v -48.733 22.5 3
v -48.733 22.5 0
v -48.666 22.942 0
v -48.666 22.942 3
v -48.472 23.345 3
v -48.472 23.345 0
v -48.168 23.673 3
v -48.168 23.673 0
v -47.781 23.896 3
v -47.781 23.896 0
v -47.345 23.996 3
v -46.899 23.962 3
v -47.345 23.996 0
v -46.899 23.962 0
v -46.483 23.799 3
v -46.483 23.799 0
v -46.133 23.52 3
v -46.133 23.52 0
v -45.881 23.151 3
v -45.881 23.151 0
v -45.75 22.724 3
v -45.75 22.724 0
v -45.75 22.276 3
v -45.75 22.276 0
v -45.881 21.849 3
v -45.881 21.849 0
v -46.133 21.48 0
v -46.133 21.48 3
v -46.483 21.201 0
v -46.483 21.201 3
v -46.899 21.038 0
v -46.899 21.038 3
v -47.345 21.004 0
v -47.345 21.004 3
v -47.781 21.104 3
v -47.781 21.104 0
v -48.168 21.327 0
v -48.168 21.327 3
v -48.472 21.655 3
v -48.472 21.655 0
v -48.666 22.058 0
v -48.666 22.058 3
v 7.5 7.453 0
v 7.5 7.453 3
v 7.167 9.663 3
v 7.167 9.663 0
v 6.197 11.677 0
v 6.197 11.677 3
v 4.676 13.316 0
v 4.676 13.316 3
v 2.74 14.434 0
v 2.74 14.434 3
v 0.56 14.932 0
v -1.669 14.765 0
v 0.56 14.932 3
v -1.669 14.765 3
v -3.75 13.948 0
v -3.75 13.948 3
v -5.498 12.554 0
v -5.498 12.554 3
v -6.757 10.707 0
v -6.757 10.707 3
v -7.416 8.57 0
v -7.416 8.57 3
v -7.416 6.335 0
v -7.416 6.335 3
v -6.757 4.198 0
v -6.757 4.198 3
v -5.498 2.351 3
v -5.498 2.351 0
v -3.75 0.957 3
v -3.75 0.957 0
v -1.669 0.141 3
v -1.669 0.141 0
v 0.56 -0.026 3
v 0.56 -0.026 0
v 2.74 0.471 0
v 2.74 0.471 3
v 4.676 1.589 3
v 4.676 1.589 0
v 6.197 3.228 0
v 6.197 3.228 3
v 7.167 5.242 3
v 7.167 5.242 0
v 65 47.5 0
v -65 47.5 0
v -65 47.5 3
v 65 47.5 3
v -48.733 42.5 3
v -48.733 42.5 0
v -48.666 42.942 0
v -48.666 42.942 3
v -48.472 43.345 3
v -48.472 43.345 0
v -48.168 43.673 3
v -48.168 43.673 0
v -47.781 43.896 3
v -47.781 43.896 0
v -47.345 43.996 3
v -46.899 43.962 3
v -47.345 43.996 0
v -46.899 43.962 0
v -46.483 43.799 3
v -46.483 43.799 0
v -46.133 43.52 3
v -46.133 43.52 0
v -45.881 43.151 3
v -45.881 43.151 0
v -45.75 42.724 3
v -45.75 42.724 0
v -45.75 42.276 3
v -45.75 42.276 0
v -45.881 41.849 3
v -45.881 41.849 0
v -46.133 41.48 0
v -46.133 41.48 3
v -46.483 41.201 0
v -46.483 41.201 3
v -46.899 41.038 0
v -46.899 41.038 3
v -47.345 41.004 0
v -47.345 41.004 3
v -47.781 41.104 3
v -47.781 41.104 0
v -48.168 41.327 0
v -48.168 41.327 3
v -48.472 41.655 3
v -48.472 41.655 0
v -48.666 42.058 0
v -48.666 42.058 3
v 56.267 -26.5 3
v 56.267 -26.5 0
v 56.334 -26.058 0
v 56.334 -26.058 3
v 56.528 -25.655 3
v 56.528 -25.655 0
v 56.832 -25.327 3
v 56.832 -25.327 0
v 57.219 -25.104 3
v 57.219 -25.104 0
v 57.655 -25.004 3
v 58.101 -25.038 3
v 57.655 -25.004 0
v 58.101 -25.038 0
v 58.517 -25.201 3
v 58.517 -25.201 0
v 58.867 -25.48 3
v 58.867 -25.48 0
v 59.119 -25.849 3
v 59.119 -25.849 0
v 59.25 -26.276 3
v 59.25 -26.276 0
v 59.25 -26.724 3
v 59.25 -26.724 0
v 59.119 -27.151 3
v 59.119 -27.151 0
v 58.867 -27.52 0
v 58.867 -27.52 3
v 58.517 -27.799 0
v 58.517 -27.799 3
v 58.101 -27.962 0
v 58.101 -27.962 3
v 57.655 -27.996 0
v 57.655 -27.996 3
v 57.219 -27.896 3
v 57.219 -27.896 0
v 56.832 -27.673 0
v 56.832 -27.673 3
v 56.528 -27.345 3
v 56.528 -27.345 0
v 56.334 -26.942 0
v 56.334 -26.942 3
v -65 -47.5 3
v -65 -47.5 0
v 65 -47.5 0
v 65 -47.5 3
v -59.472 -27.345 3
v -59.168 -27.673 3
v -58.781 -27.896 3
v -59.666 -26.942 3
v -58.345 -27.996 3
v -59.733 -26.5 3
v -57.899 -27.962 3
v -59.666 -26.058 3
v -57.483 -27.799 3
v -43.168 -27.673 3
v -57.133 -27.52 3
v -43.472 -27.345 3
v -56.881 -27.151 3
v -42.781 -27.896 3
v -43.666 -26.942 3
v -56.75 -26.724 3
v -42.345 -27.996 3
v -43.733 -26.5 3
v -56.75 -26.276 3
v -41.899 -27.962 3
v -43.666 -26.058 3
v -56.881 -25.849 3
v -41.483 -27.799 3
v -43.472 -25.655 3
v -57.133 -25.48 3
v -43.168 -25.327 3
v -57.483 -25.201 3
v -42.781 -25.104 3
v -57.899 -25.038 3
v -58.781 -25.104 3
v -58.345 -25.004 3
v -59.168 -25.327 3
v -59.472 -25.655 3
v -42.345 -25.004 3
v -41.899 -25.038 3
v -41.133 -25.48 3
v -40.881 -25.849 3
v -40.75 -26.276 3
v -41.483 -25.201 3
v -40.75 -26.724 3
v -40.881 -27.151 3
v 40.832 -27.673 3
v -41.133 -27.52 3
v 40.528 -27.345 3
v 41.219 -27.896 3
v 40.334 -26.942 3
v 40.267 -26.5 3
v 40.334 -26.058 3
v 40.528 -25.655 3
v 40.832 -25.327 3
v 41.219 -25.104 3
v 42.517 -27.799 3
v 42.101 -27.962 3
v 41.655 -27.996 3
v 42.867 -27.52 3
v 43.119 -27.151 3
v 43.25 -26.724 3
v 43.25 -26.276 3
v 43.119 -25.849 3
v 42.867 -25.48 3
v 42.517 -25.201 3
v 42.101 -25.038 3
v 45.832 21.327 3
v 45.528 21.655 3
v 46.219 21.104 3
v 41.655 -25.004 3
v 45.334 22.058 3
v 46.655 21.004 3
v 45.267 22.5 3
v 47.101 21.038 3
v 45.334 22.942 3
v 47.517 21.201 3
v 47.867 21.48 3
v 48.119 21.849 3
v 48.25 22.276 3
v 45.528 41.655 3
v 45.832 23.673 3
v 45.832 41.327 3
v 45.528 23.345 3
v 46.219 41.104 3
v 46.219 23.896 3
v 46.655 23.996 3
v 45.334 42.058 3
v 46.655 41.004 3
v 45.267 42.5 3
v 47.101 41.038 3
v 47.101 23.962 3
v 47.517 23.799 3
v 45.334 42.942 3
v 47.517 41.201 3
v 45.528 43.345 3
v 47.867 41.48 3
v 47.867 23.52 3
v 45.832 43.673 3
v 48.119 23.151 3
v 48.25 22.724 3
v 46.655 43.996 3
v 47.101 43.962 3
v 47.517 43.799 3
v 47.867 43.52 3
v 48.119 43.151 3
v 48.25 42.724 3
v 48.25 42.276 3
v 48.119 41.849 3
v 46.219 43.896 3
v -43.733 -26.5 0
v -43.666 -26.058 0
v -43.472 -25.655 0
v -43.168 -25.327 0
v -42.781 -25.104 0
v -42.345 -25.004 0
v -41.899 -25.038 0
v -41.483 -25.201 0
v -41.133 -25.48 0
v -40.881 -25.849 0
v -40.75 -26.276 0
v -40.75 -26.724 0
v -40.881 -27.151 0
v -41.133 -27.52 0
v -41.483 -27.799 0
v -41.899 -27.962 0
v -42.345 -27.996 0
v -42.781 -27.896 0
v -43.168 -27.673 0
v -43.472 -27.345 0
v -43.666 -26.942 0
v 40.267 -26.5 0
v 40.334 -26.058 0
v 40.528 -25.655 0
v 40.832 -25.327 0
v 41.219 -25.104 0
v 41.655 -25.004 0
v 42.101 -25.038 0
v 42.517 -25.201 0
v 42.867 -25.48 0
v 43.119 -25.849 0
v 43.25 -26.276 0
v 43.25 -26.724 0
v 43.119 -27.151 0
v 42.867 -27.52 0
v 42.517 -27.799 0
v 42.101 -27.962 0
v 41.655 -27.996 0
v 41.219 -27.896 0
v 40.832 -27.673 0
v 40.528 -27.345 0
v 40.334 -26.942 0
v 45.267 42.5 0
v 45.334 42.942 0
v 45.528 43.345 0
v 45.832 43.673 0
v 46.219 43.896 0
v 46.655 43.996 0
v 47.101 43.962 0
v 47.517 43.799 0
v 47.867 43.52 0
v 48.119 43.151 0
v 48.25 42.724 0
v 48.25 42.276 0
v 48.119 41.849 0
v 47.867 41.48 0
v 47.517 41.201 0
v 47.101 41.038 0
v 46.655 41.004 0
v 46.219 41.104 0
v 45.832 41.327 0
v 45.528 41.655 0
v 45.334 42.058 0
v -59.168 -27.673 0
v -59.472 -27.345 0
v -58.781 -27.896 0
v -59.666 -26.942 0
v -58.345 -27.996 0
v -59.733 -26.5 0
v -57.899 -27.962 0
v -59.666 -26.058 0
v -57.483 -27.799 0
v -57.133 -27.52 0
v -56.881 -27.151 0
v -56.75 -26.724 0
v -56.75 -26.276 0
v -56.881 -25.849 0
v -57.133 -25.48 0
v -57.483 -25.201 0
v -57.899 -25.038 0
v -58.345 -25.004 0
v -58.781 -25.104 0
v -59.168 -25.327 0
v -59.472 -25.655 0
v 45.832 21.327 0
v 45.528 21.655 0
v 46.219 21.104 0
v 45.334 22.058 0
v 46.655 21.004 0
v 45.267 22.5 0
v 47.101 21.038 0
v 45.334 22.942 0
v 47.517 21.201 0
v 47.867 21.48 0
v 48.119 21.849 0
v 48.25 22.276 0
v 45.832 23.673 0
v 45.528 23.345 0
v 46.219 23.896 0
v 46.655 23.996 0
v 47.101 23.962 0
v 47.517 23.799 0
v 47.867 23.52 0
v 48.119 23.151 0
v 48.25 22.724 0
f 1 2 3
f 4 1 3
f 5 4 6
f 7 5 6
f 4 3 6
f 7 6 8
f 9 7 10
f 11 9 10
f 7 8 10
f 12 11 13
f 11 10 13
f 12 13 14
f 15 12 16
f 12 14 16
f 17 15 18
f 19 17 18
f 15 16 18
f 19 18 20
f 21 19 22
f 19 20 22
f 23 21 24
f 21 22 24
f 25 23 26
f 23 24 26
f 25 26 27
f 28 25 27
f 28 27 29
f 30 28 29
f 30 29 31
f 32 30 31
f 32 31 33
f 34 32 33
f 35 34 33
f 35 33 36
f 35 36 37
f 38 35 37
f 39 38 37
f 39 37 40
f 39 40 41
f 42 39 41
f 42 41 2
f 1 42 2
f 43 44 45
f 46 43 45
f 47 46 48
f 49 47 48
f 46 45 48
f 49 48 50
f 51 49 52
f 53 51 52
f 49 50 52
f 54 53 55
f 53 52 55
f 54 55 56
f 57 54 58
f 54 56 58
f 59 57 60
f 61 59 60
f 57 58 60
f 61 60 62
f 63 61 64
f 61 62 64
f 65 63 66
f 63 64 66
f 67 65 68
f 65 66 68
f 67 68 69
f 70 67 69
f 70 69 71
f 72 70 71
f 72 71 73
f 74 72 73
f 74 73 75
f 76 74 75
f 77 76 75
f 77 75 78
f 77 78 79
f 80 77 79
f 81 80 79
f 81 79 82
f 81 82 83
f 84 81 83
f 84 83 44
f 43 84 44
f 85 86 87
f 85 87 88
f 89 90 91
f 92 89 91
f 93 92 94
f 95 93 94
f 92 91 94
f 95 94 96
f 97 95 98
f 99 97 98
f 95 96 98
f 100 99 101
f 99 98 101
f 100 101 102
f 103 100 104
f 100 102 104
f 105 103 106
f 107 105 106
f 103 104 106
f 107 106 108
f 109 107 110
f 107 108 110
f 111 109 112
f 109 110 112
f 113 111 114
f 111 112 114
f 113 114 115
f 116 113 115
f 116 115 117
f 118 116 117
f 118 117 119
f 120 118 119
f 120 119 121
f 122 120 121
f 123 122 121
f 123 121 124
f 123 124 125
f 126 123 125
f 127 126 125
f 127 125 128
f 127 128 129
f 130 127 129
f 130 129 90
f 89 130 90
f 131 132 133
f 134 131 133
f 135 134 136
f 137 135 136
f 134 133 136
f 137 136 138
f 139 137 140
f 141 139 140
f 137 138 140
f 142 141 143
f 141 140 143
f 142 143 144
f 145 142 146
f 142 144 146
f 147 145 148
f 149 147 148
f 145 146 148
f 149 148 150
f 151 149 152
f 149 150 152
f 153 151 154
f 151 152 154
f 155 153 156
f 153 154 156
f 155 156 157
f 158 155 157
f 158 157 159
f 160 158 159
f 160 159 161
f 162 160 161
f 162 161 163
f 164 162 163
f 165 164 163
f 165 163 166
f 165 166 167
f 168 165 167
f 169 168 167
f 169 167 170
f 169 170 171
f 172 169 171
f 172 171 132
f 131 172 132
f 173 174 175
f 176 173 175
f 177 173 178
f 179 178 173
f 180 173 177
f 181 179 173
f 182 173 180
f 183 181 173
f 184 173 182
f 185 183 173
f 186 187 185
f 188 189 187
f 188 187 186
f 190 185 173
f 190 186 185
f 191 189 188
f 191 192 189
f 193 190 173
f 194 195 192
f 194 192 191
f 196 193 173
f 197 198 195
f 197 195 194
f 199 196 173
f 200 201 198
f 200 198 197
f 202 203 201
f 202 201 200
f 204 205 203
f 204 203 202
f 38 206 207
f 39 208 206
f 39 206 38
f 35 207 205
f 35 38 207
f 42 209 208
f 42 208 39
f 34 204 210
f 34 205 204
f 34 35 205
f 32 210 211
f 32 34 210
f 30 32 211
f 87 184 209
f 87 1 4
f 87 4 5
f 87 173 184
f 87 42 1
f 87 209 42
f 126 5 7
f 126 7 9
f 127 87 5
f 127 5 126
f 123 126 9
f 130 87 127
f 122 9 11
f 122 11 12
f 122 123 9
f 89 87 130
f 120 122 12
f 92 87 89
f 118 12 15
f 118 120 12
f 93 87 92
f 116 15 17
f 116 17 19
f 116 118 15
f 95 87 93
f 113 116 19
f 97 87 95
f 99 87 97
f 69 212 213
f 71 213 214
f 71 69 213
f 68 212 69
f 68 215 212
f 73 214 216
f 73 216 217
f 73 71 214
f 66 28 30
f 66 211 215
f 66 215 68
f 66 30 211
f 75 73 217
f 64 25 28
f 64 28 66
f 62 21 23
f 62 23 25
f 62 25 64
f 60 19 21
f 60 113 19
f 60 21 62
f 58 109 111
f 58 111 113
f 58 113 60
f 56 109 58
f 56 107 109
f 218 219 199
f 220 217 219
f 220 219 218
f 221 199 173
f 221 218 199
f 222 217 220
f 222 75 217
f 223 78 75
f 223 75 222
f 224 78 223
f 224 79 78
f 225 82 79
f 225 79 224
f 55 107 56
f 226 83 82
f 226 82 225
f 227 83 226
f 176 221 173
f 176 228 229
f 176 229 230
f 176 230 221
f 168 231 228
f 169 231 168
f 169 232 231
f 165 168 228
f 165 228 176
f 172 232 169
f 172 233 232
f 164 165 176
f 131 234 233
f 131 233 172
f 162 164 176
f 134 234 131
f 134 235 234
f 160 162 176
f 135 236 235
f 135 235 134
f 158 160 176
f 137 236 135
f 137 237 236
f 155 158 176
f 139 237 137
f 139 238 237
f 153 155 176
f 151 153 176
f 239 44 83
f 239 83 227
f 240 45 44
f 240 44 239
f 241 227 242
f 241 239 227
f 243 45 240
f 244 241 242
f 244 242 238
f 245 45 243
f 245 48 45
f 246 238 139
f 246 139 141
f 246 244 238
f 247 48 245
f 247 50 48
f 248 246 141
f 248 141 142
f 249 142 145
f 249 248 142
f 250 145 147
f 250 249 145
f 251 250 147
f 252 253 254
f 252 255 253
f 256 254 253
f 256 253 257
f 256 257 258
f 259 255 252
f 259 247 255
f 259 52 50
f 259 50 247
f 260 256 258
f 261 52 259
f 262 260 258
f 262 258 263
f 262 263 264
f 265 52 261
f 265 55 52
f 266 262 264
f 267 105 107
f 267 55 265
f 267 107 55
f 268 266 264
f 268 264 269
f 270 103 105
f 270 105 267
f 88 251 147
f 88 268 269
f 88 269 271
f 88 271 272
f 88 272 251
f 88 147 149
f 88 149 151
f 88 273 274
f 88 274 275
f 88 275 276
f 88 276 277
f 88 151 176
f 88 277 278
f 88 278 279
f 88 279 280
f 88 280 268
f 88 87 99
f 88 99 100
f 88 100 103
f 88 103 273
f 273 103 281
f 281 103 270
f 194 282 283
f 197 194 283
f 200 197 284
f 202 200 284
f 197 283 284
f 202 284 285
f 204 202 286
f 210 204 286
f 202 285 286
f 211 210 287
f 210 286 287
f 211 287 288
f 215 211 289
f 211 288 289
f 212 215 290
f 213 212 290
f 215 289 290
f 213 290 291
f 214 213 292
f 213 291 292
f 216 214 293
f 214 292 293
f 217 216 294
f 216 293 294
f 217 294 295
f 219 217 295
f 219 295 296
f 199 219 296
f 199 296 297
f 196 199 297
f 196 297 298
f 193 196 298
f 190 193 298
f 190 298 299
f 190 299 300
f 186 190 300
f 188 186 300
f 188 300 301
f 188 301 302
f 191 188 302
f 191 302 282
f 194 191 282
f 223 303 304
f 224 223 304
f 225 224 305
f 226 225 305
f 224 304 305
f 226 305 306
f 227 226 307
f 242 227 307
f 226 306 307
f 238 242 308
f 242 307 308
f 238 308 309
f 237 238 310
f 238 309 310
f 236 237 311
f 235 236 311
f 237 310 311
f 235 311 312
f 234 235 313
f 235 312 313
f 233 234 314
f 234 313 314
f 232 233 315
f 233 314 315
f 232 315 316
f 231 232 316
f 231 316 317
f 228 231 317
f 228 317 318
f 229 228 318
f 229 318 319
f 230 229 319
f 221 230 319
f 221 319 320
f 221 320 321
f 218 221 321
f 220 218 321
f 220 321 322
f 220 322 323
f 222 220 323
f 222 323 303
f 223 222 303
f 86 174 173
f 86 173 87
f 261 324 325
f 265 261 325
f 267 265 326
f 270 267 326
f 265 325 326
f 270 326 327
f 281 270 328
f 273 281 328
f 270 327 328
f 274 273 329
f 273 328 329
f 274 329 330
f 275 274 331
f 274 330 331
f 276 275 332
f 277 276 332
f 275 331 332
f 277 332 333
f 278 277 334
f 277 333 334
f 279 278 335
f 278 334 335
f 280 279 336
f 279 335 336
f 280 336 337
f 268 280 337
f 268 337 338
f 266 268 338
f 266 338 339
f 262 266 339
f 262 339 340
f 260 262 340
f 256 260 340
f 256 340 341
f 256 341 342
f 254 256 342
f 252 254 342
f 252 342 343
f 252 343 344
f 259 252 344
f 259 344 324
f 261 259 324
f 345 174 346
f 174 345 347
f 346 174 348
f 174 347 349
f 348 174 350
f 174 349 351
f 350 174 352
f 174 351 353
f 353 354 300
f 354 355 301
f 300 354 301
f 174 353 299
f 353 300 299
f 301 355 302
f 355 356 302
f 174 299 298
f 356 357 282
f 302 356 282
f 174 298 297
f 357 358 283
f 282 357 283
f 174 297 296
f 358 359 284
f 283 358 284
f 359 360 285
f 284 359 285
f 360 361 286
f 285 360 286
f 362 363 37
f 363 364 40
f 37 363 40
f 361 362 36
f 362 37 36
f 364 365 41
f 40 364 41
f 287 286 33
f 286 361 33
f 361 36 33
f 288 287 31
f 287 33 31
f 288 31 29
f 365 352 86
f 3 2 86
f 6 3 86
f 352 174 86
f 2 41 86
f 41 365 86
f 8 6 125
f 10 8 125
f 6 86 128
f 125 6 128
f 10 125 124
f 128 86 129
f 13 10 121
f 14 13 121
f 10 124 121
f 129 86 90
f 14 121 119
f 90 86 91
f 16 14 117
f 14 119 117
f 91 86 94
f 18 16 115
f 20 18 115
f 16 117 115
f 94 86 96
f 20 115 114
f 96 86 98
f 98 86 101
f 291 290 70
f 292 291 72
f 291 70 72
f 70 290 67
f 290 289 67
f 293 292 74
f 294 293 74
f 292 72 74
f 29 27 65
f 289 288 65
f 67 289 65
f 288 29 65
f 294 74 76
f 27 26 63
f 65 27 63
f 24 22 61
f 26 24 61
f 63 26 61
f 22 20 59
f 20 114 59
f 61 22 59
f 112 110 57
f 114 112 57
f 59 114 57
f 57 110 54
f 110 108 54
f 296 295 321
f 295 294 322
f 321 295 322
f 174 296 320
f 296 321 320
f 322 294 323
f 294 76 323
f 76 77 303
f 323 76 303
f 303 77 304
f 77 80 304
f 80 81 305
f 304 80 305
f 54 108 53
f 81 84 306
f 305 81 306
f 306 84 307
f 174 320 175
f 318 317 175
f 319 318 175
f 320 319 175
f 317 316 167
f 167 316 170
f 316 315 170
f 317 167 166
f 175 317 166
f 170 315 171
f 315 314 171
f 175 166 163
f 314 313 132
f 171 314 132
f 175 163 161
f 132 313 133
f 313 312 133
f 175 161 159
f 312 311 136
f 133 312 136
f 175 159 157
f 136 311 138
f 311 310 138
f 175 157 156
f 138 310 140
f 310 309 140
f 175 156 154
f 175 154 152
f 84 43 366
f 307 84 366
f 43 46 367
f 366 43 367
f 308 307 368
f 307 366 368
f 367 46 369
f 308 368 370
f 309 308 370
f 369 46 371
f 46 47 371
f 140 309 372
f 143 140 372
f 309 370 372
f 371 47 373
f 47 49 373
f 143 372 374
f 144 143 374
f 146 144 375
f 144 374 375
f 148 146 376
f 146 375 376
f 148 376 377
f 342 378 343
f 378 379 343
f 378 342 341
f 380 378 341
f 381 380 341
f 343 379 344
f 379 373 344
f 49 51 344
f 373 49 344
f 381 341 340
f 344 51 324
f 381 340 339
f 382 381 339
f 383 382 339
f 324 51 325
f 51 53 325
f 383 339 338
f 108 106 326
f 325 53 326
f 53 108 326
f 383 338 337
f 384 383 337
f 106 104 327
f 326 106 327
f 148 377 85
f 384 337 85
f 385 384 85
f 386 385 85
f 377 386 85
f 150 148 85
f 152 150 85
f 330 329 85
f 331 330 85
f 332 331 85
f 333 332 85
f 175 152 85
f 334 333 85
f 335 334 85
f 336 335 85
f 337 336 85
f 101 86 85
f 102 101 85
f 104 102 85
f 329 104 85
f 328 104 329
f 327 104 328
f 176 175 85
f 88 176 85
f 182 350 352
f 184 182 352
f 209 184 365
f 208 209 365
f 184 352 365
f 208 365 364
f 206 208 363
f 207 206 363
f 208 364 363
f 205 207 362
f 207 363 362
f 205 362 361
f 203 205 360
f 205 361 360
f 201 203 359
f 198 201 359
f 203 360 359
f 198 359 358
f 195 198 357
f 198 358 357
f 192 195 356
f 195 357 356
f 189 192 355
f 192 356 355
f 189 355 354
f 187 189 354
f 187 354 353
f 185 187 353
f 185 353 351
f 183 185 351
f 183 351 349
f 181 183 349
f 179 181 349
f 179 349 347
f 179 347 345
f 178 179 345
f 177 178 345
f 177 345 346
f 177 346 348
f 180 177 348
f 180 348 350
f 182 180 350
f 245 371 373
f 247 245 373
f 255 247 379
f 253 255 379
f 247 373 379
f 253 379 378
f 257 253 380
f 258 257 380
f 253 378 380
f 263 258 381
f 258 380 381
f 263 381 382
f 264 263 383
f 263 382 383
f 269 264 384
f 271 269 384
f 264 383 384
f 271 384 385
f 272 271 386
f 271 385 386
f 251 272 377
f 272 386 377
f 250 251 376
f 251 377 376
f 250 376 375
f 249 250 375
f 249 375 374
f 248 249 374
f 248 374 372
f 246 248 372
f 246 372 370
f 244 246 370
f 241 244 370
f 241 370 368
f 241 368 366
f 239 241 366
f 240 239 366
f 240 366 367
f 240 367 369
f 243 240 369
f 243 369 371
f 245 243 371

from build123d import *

# Parameters (mm, degrees)
SKETCH_1_W          = 130
SKETCH_1_H          = 95
EXTRUDE_1_DEPTH     = 3
SKETCH_3_R          = 1.5
CUT_EXTRUDE_2_DEPTH = 10
SKETCH_4_R          = 1.5
CUT_EXTRUDE_3_DEPTH = 10
SKETCH_5_R          = 7.5
CUT_EXTRUDE_4_DEPTH = 10


with BuildPart() as part:
    # 草图1 → 凸台-拉伸1 (new body)
    with BuildSketch(Plane.XY):
        Rectangle(SKETCH_1_W, SKETCH_1_H)
    extrude(amount=EXTRUDE_1_DEPTH)

    # 草图3 → 切除-拉伸2 (cut)
    with BuildSketch(Plane(origin=(0, 0, 0), x_dir=(-1, 0, 0), z_dir=(0, 0, -1))):
        with Locations((-57.767112616, -26.5)):
            Circle(SKETCH_3_R)
        with Locations((-41.767112616, -26.5)):
            Circle(SKETCH_3_R)
        with Locations((42.232887384, -26.5)):
            Circle(SKETCH_3_R)
        with Locations((58.232887384, -26.5)):
            Circle(SKETCH_3_R)
    extrude(amount=-CUT_EXTRUDE_2_DEPTH, mode=Mode.SUBTRACT)

    # 草图4 → 切除-拉伸3 (cut)
    with BuildSketch(Plane(origin=(0, 0, 0), x_dir=(-1, 0, 0), z_dir=(0, 0, -1))):
        with Locations((-46.767112616, 42.5)):
            Circle(SKETCH_4_R)
        with Locations((-46.767112616, 22.5)):
            Circle(SKETCH_4_R)
        with Locations((47.232887384, 42.5)):
            Circle(SKETCH_4_R)
        with Locations((47.232887384, 22.5)):
            Circle(SKETCH_4_R)
    extrude(amount=-CUT_EXTRUDE_3_DEPTH, mode=Mode.SUBTRACT)

    # 草图5 → 切除-拉伸4 (cut)
    with BuildSketch(Plane.XY.offset(3)):
        with Locations((0, 7.452587902)):
            Circle(SKETCH_5_R)
    extrude(amount=-CUT_EXTRUDE_4_DEPTH, mode=Mode.SUBTRACT)


solid = part.part
